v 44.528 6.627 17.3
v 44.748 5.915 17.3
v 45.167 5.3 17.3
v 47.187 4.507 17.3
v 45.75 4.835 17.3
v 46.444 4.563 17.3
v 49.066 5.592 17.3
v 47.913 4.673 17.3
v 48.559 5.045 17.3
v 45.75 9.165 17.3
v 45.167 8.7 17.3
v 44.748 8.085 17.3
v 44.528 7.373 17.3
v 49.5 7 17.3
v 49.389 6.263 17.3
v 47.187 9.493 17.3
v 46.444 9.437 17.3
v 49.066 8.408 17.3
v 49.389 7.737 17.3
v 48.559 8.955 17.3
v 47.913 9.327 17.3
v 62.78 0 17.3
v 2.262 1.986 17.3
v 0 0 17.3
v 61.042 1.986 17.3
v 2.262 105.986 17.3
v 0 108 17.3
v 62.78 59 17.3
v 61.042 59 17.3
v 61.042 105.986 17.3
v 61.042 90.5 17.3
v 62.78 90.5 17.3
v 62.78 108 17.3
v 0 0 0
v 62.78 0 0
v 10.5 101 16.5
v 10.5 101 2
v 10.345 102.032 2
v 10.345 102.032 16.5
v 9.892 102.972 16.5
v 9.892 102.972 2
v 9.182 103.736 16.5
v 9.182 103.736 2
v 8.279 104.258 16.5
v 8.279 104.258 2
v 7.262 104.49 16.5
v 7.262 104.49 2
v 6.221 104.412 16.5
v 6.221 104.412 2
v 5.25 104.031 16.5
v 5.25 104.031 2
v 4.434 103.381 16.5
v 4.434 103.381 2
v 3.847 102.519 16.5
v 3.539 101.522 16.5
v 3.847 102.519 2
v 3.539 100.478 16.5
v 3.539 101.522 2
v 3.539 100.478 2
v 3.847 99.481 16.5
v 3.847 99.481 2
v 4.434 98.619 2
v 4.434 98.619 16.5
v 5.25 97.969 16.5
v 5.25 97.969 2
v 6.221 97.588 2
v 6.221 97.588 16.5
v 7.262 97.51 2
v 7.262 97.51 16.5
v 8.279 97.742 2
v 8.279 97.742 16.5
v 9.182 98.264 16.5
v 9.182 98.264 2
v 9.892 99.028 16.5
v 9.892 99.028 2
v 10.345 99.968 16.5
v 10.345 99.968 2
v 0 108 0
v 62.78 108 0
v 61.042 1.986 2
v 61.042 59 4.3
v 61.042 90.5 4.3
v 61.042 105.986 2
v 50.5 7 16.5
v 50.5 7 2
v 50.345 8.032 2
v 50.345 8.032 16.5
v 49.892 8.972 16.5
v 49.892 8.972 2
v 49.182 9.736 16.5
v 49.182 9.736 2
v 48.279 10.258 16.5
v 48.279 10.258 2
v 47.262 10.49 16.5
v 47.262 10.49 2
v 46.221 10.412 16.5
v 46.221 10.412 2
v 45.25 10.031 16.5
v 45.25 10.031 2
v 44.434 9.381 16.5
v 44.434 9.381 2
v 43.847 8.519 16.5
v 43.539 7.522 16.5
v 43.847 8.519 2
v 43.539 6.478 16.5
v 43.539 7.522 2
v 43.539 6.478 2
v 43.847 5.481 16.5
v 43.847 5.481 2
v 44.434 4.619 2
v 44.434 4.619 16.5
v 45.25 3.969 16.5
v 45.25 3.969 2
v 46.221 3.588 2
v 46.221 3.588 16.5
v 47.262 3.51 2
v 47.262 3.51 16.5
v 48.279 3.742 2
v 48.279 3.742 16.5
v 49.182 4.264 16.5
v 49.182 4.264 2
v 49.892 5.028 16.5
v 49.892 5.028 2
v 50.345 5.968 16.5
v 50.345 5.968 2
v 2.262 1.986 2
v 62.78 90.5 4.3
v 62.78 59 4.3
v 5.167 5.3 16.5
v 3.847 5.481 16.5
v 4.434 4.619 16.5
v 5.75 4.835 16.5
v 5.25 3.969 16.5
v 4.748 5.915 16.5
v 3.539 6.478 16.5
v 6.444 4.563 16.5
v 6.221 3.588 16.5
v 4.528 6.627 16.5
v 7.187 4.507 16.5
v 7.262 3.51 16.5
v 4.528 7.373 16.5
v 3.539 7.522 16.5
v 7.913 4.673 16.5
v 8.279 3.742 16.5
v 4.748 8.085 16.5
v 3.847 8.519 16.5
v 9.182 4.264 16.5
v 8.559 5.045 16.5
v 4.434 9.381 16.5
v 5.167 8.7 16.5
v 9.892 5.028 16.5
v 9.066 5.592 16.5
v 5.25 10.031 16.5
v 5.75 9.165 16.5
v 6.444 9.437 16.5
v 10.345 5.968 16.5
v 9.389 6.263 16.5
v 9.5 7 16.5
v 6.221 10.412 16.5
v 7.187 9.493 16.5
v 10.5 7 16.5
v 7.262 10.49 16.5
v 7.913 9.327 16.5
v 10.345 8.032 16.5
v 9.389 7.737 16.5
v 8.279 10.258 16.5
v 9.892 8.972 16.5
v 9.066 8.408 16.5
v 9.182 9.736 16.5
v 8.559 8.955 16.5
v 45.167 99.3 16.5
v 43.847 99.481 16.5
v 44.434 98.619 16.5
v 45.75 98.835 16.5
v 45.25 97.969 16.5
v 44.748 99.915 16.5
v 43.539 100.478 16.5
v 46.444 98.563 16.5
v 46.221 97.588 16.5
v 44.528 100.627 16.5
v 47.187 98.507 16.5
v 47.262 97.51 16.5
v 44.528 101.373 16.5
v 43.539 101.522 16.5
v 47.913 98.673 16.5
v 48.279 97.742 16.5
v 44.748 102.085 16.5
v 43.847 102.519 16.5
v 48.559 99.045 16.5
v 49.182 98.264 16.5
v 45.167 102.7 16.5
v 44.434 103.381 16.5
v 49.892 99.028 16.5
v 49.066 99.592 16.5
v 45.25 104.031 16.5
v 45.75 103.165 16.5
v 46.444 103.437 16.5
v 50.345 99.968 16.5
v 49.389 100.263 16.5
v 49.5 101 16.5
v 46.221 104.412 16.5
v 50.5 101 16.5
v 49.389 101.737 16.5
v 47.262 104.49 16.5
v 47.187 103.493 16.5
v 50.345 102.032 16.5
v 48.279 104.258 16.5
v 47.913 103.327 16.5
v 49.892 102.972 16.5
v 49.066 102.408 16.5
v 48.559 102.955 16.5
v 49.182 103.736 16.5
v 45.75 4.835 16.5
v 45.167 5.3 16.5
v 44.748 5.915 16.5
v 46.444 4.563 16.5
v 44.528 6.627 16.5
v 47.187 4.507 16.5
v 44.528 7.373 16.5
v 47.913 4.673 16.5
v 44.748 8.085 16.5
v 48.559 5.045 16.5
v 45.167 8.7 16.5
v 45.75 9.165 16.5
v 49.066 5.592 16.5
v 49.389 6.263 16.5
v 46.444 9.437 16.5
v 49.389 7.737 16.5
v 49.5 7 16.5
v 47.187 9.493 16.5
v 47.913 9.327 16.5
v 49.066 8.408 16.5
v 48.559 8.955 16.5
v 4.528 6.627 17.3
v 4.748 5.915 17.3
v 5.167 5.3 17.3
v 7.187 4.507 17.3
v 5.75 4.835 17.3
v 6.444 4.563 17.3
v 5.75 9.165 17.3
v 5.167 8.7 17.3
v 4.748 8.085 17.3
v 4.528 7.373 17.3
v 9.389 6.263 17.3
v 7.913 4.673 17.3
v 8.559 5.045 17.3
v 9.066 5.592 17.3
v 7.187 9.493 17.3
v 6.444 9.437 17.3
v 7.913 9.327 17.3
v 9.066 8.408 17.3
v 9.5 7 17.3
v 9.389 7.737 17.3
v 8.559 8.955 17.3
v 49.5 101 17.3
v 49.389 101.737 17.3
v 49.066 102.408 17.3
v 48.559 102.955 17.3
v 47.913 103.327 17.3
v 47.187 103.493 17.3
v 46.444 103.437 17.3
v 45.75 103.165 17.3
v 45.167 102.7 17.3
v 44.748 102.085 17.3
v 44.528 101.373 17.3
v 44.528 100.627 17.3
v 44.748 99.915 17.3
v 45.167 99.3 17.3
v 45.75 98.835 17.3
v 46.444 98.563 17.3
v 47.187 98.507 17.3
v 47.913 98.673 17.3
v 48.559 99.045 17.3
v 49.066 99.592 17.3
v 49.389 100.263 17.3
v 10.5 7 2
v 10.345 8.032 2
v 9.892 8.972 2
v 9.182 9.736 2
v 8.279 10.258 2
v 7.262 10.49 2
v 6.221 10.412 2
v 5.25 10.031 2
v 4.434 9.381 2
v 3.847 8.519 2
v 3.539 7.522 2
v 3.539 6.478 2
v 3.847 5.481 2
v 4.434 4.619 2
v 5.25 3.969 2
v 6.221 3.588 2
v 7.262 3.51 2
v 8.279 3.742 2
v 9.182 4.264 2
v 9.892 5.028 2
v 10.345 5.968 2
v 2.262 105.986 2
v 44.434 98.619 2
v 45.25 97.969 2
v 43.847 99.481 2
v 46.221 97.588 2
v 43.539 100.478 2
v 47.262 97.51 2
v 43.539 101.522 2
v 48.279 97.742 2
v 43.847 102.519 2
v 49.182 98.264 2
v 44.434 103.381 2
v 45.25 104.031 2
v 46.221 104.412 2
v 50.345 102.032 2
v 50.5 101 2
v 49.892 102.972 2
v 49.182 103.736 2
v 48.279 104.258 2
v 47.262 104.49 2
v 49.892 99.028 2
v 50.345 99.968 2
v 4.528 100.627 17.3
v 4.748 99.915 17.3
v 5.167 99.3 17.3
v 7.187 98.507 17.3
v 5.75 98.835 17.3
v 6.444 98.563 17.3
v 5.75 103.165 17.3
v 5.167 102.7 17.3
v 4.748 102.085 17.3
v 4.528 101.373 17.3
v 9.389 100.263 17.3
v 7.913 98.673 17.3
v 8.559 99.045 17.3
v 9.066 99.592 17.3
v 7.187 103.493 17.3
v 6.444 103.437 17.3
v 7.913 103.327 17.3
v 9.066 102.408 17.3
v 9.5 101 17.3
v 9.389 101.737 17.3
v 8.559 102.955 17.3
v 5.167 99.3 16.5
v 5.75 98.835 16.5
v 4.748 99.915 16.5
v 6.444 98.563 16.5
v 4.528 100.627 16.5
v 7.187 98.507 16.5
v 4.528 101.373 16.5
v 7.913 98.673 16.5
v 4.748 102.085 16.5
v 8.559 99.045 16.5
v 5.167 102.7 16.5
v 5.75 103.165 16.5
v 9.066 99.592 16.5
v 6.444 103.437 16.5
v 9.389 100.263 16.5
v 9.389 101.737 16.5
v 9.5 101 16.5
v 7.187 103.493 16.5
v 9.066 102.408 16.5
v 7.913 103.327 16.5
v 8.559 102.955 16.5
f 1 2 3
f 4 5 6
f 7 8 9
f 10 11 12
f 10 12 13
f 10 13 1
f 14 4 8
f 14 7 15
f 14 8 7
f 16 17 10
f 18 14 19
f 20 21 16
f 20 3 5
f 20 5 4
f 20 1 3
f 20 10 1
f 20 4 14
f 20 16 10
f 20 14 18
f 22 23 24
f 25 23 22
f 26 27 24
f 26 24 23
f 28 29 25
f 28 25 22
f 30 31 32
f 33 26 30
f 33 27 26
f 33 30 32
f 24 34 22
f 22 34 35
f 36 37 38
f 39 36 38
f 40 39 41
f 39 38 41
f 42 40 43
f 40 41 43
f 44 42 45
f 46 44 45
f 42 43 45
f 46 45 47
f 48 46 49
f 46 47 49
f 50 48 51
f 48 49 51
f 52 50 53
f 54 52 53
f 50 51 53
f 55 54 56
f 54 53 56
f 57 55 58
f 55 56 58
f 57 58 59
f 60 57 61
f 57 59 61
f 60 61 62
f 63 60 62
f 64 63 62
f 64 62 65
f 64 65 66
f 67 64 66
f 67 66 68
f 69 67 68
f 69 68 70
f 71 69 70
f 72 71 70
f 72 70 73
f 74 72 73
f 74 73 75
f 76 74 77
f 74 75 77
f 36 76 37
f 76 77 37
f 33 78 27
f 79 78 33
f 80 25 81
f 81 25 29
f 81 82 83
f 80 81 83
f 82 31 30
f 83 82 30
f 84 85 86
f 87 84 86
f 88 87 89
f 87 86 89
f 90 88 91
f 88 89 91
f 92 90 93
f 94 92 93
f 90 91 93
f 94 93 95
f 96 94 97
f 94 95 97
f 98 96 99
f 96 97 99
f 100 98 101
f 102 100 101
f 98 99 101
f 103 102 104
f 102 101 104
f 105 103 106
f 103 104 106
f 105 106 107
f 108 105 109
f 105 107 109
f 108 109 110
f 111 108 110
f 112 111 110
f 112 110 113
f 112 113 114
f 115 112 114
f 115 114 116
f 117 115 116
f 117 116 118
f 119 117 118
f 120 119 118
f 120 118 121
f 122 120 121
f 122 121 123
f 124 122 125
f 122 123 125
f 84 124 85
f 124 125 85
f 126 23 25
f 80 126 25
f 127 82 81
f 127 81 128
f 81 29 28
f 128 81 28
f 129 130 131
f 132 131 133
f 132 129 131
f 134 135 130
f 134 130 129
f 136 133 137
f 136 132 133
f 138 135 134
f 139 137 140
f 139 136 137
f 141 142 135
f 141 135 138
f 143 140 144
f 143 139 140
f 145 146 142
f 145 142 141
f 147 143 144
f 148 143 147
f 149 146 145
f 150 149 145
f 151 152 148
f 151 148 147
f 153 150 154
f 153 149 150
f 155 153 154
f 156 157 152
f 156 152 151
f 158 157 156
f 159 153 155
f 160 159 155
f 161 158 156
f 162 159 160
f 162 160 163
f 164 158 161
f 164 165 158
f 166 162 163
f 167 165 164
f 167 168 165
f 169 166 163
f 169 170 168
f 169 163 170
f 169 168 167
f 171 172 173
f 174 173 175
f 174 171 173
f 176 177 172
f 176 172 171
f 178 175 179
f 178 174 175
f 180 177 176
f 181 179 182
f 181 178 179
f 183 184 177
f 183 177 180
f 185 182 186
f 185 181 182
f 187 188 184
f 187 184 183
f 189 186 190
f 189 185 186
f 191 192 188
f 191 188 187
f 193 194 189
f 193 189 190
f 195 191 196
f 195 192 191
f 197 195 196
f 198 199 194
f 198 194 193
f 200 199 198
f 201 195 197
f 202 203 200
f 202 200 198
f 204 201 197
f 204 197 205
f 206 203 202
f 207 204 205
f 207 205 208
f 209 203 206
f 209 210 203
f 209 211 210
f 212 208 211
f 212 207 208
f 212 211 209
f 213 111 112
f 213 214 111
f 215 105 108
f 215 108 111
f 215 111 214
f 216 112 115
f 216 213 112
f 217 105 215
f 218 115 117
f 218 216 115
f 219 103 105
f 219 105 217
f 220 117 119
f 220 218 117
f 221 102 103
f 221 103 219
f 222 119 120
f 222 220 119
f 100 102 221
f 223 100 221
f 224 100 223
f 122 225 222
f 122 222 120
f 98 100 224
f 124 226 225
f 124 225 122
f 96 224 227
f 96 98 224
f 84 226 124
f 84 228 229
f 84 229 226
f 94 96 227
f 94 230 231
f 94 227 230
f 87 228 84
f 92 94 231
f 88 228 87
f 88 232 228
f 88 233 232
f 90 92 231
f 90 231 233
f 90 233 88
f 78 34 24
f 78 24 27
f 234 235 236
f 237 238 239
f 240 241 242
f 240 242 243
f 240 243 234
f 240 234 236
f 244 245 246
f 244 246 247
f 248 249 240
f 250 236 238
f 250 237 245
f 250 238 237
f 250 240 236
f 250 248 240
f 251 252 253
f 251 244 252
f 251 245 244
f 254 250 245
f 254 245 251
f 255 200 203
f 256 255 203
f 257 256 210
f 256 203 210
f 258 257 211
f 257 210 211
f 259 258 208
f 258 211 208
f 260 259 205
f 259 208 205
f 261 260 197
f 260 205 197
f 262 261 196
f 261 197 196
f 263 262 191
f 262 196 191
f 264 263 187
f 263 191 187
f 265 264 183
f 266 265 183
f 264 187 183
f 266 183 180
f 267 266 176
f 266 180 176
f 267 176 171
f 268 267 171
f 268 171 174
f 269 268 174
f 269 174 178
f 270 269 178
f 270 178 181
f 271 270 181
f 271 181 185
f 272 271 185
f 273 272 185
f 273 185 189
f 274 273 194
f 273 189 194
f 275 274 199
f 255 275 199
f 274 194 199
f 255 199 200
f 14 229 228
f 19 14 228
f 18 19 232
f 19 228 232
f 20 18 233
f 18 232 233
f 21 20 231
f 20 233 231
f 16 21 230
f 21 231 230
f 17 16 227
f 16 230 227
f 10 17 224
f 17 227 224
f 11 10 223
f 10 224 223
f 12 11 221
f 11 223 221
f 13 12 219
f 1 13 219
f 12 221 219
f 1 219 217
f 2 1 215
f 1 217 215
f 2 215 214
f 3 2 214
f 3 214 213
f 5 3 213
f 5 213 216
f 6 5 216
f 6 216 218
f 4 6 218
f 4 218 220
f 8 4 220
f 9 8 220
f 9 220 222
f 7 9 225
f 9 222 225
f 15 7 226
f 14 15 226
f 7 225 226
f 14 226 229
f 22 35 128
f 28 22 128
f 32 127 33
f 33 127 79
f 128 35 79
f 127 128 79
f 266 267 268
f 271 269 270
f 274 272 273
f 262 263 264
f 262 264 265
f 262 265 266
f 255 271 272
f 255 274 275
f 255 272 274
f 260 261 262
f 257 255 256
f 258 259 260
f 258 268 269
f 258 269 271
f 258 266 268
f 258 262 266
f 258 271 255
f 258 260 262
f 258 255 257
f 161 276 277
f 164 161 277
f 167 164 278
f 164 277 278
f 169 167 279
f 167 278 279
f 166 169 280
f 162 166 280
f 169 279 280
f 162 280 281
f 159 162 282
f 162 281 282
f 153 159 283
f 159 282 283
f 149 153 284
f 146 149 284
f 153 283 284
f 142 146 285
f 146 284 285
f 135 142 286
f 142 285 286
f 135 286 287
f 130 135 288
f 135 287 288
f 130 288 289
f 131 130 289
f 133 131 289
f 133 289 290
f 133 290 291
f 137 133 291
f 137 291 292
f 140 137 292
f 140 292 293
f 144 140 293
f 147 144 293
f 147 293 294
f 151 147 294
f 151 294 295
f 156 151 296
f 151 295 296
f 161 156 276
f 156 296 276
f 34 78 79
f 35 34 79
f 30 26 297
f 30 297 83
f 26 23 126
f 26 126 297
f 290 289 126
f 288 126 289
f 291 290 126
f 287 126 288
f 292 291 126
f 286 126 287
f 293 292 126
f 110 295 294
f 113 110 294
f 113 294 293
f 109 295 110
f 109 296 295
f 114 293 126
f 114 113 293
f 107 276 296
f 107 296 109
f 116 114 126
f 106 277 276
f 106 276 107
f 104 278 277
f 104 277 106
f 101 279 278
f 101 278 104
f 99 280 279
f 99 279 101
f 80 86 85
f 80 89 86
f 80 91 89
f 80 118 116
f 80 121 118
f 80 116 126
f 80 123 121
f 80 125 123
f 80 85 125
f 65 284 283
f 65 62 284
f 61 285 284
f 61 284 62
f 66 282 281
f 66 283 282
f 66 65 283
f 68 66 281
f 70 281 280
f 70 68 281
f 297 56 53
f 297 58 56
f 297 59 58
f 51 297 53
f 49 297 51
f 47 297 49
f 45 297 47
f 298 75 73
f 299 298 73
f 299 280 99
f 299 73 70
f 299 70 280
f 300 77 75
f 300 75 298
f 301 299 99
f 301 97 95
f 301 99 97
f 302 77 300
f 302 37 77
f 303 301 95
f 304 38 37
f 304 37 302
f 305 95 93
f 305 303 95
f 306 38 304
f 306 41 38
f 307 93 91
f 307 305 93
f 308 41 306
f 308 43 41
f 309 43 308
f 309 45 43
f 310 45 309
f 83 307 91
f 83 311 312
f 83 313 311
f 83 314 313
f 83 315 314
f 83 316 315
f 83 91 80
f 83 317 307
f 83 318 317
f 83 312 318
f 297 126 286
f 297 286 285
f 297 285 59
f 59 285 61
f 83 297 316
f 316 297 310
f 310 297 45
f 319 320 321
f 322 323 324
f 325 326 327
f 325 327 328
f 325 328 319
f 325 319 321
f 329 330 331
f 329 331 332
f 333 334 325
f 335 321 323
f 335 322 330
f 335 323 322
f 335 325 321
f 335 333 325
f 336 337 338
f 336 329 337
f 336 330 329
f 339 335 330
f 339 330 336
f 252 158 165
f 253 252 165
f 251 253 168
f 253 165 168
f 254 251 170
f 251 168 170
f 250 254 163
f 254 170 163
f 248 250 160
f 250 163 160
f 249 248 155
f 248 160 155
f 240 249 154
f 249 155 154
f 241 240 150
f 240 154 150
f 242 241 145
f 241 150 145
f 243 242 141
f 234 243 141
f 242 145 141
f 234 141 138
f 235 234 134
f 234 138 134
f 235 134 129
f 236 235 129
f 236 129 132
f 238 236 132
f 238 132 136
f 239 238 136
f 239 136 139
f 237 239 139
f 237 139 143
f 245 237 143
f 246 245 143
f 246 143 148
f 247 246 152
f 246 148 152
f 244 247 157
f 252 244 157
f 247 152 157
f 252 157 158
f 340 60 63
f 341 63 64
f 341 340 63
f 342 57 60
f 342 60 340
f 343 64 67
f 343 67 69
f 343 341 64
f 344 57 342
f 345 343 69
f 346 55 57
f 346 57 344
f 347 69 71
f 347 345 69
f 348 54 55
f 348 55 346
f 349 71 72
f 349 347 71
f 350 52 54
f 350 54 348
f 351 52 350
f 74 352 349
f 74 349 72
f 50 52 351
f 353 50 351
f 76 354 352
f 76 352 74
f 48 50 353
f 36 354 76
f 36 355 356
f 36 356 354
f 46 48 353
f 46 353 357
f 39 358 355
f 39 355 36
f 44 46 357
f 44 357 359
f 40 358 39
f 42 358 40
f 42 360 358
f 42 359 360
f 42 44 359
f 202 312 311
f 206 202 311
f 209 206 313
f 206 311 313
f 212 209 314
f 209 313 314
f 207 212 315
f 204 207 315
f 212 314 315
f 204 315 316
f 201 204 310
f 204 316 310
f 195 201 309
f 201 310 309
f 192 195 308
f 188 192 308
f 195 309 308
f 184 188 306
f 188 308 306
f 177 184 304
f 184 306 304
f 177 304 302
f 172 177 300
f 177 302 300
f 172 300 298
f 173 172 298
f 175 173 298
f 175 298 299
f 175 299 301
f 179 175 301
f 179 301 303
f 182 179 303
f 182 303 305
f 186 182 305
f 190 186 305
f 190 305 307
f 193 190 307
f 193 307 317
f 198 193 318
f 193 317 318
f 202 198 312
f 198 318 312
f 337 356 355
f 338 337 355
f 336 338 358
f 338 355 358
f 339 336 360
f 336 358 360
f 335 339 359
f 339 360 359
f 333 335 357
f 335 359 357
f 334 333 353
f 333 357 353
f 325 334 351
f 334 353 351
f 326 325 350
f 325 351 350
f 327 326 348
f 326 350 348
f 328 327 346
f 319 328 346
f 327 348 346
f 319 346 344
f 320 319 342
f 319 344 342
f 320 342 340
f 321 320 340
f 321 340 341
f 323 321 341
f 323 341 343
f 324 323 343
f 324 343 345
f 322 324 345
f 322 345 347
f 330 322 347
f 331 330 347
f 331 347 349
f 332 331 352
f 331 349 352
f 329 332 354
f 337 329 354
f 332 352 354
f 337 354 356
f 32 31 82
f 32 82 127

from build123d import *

# Parameters (mm, degrees)
BOX_W           = 62.78
BOX_H           = 108
BOX_DEPTH       = 17.3
SKETCH_W        = 58.78
SKETCH_H        = 104
POCKET_DEPTH    = 15.3
SKETCH001_W     = 2.23
SKETCH001_H     = 31.5
POCKET001_DEPTH = 13
SKETCH002_R     = 3.5
PAD_DEPTH       = 14.5
SKETCH003_R     = 2.5
PAD001_DEPTH    = 0.8


with BuildPart() as part:
    # Box → Box (new body)
    with BuildSketch(Plane.XY):
        with Locations((31.39, 54)):
            Rectangle(BOX_W, BOX_H)
    extrude(amount=BOX_DEPTH)

    # Sketch (on Face6 of Box) → Pocket (cut)
    with BuildSketch(Plane.XY.offset(17.3)):
        with Locations((31.651668, 53.986192)):
            Rectangle(SKETCH_W, SKETCH_H)
    extrude(amount=-POCKET_DEPTH, mode=Mode.SUBTRACT)

    # Sketch001 (on Face3 of Pocket) → Pocket001 (cut)
    with BuildSketch(Plane.XY.offset(17.3)):
        with Locations((61.972029, 74.75)):
            Rectangle(SKETCH001_W, SKETCH001_H)
    extrude(amount=-POCKET001_DEPTH, mode=Mode.SUBTRACT)

    # Sketch002 (on Face14 of Pocket001) → Pad (join)
    with BuildSketch(Plane.XY.offset(2)):
        with Locations((7, 101)):
            Circle(SKETCH002_R)
        with Locations((47, 101)):
            Circle(SKETCH002_R)
        with Locations((7, 7)):
            Circle(SKETCH002_R)
        with Locations((47, 7)):
            Circle(SKETCH002_R)
    extrude(amount=PAD_DEPTH)

    # Sketch003 (on Face20 of Pad) → Pad001 (join)
    with BuildSketch(Plane.XY.offset(16.5)):
        with Locations((7, 7)):
            Circle(SKETCH003_R)
        with Locations((47, 7)):
            Circle(SKETCH003_R)
        with Locations((7, 101)):
            Circle(SKETCH003_R)
        with Locations((47, 101)):
            Circle(SKETCH003_R)
    extrude(amount=PAD001_DEPTH)


solid = part.part
